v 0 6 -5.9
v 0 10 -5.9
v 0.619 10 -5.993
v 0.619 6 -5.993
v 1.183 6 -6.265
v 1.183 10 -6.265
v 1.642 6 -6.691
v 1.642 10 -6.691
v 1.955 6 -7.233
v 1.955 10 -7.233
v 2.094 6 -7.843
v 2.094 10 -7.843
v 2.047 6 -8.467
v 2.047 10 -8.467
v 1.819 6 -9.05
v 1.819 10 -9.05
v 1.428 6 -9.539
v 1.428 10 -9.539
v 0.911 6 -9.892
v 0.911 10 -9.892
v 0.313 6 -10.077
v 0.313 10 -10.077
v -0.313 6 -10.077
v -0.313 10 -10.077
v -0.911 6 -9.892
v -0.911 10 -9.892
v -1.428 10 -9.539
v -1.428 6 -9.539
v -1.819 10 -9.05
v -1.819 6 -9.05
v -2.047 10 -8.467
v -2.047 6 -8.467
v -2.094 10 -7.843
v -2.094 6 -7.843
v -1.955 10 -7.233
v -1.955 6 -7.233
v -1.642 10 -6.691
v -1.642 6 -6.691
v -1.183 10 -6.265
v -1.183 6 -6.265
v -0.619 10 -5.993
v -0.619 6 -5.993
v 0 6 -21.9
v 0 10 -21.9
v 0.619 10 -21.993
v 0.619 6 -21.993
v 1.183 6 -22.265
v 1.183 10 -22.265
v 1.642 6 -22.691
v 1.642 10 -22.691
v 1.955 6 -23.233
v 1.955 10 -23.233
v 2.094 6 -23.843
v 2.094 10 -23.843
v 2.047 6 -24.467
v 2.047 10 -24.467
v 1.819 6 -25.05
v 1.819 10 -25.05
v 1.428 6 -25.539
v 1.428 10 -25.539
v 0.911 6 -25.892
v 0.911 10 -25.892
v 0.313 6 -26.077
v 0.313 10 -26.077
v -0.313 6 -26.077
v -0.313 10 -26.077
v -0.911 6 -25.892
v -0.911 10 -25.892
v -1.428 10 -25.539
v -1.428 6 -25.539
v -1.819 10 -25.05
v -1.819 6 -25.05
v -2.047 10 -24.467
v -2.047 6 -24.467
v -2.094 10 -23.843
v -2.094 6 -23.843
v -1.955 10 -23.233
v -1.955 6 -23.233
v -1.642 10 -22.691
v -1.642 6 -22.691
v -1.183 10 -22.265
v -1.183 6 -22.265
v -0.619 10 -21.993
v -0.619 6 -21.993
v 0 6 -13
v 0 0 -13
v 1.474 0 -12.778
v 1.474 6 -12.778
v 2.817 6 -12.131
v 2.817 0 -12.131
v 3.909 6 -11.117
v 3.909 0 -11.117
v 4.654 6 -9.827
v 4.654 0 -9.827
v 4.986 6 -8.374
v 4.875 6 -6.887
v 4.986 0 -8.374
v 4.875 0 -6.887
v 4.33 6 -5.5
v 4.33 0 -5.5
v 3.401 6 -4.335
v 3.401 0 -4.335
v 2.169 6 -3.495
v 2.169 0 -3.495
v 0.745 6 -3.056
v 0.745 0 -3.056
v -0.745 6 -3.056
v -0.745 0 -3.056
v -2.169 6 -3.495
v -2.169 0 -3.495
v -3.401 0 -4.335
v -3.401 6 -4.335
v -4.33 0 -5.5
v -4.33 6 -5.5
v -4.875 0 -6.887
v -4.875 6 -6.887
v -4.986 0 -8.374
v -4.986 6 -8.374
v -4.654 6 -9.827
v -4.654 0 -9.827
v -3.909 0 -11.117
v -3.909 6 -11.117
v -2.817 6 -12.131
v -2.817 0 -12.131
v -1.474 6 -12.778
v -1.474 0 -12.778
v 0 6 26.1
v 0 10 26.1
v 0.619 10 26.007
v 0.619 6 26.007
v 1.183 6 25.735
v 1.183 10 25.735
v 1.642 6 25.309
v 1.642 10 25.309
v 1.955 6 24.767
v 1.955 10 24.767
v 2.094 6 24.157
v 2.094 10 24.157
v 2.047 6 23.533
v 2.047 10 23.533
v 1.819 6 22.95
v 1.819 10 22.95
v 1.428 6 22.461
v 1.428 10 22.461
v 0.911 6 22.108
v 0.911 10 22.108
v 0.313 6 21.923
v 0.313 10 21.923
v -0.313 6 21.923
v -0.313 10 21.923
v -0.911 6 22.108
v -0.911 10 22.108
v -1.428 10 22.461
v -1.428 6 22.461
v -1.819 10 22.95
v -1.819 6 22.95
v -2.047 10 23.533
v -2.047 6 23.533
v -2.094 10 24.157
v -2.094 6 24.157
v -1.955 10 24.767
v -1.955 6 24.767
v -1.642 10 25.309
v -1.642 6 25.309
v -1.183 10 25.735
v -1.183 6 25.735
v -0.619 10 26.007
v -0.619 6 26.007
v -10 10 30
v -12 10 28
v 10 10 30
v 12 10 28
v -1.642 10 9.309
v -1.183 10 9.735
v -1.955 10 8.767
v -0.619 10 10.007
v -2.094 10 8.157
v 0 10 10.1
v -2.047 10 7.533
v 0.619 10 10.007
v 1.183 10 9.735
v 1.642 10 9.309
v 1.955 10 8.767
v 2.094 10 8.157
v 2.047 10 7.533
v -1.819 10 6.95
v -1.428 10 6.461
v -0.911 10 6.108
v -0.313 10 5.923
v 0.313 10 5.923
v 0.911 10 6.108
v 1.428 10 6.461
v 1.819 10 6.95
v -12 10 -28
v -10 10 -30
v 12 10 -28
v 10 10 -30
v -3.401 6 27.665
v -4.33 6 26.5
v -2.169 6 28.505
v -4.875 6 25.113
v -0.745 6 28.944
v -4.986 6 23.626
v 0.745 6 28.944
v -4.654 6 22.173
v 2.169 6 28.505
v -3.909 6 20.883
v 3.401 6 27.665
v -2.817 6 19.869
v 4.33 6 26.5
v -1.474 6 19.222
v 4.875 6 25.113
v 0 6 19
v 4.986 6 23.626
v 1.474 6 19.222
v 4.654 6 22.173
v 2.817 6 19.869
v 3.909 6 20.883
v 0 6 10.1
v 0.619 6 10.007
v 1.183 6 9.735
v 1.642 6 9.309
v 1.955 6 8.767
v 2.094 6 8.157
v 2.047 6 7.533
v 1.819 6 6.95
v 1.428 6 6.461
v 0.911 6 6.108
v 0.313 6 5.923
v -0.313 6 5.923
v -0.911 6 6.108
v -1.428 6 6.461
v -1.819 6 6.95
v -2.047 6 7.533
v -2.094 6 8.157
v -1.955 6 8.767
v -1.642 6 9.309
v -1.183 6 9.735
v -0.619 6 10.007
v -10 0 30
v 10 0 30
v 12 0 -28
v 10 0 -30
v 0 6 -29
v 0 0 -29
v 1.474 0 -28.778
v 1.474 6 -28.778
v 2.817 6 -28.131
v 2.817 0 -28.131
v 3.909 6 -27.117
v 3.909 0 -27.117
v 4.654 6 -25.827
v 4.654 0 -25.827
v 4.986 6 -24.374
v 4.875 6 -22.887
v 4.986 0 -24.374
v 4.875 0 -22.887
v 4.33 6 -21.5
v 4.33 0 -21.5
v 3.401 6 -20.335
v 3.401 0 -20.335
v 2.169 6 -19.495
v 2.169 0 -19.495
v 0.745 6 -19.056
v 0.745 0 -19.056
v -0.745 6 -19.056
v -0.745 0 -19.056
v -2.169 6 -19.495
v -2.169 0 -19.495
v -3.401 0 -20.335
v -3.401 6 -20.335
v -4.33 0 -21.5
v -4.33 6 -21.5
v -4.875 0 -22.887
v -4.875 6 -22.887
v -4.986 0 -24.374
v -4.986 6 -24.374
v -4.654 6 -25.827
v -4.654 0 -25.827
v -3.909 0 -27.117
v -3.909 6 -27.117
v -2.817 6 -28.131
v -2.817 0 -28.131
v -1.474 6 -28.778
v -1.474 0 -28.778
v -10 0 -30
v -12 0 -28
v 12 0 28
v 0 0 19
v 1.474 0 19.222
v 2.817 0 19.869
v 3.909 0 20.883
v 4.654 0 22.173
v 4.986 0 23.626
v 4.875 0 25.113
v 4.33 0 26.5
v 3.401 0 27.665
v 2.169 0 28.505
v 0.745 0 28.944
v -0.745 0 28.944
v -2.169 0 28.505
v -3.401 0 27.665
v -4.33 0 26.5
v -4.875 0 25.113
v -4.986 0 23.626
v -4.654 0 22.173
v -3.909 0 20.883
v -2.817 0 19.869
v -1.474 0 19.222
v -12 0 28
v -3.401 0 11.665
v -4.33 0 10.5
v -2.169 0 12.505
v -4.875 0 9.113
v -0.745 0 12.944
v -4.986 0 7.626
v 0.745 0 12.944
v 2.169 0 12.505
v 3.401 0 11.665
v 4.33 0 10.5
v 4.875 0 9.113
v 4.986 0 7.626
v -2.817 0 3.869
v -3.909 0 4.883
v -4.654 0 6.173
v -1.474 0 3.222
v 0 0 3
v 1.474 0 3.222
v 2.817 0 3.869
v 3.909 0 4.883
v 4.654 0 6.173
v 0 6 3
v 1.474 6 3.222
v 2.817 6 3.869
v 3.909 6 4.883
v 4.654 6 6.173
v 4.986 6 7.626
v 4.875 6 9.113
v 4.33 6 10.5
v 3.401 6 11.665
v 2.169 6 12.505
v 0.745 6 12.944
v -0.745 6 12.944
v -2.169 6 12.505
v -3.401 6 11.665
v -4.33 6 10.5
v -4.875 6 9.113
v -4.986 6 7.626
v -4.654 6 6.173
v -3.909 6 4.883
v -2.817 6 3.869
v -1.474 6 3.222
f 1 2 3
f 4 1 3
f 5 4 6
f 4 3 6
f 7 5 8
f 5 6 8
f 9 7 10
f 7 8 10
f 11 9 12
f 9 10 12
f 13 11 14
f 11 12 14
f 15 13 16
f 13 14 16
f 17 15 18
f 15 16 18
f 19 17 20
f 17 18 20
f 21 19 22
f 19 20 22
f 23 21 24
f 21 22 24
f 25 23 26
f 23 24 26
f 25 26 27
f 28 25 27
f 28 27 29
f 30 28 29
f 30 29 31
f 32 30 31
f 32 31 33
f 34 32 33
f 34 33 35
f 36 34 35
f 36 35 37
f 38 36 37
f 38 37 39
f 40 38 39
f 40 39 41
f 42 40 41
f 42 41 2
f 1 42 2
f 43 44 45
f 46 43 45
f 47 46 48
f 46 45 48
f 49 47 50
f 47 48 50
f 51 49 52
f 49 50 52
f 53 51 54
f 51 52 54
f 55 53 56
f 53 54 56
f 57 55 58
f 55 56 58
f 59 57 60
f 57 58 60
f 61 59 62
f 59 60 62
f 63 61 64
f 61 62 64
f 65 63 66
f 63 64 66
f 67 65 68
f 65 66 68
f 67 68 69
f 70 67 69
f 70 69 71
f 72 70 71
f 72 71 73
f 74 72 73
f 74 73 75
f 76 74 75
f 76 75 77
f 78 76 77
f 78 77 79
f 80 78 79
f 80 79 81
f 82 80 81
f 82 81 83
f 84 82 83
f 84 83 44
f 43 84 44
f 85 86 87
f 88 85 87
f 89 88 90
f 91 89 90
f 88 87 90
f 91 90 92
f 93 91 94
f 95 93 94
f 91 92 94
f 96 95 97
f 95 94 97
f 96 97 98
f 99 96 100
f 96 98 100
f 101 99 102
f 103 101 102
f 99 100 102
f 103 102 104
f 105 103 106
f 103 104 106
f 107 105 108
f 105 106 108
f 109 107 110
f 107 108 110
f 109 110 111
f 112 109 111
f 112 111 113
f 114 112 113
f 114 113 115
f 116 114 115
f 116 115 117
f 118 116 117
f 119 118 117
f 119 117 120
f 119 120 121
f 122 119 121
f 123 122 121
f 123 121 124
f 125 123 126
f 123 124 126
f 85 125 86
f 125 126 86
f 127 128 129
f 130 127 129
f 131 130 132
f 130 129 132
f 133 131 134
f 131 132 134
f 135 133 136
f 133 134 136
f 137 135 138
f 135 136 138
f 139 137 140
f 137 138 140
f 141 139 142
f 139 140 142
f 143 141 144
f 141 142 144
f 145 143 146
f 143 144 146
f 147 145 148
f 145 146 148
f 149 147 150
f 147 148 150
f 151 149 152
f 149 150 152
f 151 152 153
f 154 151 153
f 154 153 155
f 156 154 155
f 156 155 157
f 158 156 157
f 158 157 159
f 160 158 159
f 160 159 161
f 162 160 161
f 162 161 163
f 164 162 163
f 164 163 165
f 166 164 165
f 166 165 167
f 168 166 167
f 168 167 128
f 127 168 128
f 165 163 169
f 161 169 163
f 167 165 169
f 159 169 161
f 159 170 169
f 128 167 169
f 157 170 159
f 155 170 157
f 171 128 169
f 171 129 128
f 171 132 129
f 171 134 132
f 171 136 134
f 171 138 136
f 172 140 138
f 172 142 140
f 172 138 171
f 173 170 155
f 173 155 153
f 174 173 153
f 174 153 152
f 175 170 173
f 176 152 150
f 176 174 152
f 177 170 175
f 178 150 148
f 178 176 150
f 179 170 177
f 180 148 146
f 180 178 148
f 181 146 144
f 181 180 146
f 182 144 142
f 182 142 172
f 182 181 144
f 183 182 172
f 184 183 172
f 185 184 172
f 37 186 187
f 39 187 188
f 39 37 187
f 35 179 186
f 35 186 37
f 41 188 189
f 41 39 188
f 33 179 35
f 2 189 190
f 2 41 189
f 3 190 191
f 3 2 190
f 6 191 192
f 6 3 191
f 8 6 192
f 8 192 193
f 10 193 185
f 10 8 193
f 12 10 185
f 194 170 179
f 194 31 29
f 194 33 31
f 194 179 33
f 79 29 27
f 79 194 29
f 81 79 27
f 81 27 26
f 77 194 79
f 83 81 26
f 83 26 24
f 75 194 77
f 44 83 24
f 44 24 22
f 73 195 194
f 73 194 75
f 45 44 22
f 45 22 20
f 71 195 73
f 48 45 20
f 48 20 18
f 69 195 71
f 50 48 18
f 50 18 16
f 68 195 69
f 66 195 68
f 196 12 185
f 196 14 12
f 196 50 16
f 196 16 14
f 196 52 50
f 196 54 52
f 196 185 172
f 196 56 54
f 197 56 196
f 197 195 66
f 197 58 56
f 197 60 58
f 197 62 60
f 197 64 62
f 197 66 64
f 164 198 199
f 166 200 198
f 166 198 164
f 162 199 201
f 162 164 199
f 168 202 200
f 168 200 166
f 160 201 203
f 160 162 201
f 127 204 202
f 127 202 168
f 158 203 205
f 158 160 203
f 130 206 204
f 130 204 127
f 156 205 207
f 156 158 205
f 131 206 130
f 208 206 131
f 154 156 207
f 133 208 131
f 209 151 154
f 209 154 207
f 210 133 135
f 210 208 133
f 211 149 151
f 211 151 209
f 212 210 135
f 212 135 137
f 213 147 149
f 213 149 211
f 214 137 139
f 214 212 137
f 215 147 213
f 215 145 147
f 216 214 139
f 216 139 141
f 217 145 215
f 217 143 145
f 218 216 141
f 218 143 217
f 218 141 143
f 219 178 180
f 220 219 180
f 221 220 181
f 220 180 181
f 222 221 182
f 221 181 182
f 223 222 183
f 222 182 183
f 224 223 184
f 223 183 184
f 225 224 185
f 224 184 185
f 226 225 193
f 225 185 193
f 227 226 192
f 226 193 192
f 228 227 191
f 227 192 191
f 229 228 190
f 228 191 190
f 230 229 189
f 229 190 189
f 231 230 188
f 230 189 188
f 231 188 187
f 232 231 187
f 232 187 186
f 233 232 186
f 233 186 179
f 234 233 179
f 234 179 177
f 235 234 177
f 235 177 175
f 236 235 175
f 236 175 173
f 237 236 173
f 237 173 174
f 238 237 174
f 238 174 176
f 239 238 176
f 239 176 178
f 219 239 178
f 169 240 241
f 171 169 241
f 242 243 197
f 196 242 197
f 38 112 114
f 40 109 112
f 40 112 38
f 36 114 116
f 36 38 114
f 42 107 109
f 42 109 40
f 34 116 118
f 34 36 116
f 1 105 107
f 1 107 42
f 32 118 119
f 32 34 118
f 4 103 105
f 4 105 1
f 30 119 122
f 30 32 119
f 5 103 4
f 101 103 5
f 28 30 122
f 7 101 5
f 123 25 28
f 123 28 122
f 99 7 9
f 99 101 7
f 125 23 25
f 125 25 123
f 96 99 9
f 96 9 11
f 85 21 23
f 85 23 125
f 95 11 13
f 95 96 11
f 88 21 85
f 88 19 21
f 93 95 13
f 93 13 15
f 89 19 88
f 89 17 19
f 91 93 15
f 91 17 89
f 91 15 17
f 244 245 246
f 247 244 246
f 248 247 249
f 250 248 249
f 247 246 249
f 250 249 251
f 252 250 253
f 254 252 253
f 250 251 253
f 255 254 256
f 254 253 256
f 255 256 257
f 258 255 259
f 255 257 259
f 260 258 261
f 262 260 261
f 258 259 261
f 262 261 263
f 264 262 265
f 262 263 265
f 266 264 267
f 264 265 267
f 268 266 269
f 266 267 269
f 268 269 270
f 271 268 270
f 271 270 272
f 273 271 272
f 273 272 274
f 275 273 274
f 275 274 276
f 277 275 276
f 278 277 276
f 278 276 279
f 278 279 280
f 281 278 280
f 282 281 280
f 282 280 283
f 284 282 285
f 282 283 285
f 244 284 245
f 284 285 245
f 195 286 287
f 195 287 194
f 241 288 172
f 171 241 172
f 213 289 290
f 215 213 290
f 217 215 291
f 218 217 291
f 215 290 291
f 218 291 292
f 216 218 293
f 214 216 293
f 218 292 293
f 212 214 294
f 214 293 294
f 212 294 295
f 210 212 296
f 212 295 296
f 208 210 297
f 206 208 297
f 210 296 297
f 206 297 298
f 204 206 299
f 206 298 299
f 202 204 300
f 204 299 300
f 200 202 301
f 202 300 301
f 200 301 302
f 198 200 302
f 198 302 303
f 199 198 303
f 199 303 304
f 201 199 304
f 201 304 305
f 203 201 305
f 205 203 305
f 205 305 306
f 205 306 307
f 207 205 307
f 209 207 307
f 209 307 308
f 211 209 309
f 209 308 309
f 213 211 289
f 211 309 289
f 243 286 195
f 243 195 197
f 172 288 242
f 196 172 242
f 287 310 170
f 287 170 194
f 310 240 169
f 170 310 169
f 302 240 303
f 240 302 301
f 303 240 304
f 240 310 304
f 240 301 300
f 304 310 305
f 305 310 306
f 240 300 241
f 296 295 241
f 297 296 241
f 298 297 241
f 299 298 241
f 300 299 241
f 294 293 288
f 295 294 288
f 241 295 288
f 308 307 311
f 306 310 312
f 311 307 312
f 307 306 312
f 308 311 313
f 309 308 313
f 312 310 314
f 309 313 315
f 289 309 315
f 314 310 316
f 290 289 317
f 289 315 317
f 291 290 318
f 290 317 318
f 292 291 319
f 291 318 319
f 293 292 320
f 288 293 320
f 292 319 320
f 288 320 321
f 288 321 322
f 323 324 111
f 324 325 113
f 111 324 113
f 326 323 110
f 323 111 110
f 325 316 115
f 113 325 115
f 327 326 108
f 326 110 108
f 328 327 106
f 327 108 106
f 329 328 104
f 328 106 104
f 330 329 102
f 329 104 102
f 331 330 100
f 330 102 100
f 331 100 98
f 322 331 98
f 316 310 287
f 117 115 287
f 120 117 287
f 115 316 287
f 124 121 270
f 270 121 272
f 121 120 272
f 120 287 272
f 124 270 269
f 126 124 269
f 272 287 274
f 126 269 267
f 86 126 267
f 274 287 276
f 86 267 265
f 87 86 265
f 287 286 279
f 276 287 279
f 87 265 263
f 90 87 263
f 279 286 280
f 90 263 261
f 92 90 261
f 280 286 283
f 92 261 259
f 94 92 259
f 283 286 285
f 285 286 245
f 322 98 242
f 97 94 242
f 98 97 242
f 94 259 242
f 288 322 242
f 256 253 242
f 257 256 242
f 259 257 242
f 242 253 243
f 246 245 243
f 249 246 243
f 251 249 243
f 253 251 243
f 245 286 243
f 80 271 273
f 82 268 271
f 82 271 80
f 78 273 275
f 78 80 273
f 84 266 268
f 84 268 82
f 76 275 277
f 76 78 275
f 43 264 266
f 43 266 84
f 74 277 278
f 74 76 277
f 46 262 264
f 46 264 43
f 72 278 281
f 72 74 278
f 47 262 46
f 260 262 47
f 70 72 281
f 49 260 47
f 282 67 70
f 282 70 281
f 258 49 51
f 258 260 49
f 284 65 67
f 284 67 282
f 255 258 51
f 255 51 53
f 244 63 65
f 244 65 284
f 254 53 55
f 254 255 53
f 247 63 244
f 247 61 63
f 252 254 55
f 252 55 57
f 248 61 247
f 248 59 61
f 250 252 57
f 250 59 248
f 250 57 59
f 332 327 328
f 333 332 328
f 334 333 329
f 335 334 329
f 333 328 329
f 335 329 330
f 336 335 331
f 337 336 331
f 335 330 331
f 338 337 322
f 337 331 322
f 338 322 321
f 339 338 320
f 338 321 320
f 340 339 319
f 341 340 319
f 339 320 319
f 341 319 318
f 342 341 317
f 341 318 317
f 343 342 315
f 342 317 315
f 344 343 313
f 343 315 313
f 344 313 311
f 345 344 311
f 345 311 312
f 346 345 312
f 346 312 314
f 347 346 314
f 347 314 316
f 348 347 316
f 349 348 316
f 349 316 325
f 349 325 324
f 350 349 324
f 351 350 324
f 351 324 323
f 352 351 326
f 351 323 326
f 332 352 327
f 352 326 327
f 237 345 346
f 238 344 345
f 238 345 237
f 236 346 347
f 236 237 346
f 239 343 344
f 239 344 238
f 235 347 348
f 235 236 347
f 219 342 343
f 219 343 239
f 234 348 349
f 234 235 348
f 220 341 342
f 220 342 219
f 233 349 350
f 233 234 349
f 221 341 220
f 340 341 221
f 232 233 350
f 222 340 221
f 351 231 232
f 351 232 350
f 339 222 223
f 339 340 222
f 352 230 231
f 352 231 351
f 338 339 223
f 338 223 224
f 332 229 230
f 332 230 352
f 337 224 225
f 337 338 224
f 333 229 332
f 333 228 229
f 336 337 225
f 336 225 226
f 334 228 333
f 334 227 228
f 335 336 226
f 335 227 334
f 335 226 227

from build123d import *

# Parameters (mm, degrees)
SKETCH_1_W          = 24
SKETCH_1_H          = 60
EXTRUDE_1_DEPTH     = 10
CHAMFER_1_SIZE      = 2
SKETCH_3_R          = 2.1
CUT_EXTRUDE_1_DEPTH = 15
SKETCH_4_R          = 5
CUT_EXTRUDE_2_DEPTH = 6


with BuildPart() as part:
    # 草图1 → 凸台-拉伸1 (new body)
    with BuildSketch(Plane(origin=(0, 0, 0), x_dir=(1, 0, 0), z_dir=(0, 1, 0))):
        Rectangle(SKETCH_1_W, SKETCH_1_H)
    extrude(amount=EXTRUDE_1_DEPTH)

    # 倒角1
    chamfer_1_edges = [part.edges().sort_by_distance(p)[0] for p in [
        (12, 5, 30),
        (-12, 5, 30),
        (-12, 5, -30),
        (12, 5, -30),
    ]]
    chamfer(chamfer_1_edges, length=CHAMFER_1_SIZE)

    # 草图3 → 切除-拉伸1 (cut)
    with BuildSketch(Plane(origin=(0, 10, 0), x_dir=(1, 0, 0), z_dir=(0, 1, 0))):
        with Locations(Location((0, -8, 0), (0, 0, 270))):
            Circle(SKETCH_3_R)
        with Locations(Location((0, 8, 0), (0, 0, 270))):
            Circle(SKETCH_3_R)
        with Locations(Location((0, -24, 0), (0, 0, 270))):
            Circle(SKETCH_3_R)
        with Locations(Location((0, 24, 0), (0, 0, 270))):
            Circle(SKETCH_3_R)
    extrude(amount=-CUT_EXTRUDE_1_DEPTH, mode=Mode.SUBTRACT)

    # 草图4 → 切除-拉伸2 (cut)
    with BuildSketch(Plane.XZ):
        with Locations(Location((0, -24, 0), (0, 0, 270))):
            Circle(SKETCH_4_R)
        with Locations(Location((0, -8, 0), (0, 0, 270))):
            Circle(SKETCH_4_R)
        with Locations(Location((0, 8, 0), (0, 0, 270))):
            Circle(SKETCH_4_R)
        with Locations(Location((0, 24, 0), (0, 0, 270))):
            Circle(SKETCH_4_R)
    extrude(amount=-CUT_EXTRUDE_2_DEPTH, mode=Mode.SUBTRACT)


solid = part.part
